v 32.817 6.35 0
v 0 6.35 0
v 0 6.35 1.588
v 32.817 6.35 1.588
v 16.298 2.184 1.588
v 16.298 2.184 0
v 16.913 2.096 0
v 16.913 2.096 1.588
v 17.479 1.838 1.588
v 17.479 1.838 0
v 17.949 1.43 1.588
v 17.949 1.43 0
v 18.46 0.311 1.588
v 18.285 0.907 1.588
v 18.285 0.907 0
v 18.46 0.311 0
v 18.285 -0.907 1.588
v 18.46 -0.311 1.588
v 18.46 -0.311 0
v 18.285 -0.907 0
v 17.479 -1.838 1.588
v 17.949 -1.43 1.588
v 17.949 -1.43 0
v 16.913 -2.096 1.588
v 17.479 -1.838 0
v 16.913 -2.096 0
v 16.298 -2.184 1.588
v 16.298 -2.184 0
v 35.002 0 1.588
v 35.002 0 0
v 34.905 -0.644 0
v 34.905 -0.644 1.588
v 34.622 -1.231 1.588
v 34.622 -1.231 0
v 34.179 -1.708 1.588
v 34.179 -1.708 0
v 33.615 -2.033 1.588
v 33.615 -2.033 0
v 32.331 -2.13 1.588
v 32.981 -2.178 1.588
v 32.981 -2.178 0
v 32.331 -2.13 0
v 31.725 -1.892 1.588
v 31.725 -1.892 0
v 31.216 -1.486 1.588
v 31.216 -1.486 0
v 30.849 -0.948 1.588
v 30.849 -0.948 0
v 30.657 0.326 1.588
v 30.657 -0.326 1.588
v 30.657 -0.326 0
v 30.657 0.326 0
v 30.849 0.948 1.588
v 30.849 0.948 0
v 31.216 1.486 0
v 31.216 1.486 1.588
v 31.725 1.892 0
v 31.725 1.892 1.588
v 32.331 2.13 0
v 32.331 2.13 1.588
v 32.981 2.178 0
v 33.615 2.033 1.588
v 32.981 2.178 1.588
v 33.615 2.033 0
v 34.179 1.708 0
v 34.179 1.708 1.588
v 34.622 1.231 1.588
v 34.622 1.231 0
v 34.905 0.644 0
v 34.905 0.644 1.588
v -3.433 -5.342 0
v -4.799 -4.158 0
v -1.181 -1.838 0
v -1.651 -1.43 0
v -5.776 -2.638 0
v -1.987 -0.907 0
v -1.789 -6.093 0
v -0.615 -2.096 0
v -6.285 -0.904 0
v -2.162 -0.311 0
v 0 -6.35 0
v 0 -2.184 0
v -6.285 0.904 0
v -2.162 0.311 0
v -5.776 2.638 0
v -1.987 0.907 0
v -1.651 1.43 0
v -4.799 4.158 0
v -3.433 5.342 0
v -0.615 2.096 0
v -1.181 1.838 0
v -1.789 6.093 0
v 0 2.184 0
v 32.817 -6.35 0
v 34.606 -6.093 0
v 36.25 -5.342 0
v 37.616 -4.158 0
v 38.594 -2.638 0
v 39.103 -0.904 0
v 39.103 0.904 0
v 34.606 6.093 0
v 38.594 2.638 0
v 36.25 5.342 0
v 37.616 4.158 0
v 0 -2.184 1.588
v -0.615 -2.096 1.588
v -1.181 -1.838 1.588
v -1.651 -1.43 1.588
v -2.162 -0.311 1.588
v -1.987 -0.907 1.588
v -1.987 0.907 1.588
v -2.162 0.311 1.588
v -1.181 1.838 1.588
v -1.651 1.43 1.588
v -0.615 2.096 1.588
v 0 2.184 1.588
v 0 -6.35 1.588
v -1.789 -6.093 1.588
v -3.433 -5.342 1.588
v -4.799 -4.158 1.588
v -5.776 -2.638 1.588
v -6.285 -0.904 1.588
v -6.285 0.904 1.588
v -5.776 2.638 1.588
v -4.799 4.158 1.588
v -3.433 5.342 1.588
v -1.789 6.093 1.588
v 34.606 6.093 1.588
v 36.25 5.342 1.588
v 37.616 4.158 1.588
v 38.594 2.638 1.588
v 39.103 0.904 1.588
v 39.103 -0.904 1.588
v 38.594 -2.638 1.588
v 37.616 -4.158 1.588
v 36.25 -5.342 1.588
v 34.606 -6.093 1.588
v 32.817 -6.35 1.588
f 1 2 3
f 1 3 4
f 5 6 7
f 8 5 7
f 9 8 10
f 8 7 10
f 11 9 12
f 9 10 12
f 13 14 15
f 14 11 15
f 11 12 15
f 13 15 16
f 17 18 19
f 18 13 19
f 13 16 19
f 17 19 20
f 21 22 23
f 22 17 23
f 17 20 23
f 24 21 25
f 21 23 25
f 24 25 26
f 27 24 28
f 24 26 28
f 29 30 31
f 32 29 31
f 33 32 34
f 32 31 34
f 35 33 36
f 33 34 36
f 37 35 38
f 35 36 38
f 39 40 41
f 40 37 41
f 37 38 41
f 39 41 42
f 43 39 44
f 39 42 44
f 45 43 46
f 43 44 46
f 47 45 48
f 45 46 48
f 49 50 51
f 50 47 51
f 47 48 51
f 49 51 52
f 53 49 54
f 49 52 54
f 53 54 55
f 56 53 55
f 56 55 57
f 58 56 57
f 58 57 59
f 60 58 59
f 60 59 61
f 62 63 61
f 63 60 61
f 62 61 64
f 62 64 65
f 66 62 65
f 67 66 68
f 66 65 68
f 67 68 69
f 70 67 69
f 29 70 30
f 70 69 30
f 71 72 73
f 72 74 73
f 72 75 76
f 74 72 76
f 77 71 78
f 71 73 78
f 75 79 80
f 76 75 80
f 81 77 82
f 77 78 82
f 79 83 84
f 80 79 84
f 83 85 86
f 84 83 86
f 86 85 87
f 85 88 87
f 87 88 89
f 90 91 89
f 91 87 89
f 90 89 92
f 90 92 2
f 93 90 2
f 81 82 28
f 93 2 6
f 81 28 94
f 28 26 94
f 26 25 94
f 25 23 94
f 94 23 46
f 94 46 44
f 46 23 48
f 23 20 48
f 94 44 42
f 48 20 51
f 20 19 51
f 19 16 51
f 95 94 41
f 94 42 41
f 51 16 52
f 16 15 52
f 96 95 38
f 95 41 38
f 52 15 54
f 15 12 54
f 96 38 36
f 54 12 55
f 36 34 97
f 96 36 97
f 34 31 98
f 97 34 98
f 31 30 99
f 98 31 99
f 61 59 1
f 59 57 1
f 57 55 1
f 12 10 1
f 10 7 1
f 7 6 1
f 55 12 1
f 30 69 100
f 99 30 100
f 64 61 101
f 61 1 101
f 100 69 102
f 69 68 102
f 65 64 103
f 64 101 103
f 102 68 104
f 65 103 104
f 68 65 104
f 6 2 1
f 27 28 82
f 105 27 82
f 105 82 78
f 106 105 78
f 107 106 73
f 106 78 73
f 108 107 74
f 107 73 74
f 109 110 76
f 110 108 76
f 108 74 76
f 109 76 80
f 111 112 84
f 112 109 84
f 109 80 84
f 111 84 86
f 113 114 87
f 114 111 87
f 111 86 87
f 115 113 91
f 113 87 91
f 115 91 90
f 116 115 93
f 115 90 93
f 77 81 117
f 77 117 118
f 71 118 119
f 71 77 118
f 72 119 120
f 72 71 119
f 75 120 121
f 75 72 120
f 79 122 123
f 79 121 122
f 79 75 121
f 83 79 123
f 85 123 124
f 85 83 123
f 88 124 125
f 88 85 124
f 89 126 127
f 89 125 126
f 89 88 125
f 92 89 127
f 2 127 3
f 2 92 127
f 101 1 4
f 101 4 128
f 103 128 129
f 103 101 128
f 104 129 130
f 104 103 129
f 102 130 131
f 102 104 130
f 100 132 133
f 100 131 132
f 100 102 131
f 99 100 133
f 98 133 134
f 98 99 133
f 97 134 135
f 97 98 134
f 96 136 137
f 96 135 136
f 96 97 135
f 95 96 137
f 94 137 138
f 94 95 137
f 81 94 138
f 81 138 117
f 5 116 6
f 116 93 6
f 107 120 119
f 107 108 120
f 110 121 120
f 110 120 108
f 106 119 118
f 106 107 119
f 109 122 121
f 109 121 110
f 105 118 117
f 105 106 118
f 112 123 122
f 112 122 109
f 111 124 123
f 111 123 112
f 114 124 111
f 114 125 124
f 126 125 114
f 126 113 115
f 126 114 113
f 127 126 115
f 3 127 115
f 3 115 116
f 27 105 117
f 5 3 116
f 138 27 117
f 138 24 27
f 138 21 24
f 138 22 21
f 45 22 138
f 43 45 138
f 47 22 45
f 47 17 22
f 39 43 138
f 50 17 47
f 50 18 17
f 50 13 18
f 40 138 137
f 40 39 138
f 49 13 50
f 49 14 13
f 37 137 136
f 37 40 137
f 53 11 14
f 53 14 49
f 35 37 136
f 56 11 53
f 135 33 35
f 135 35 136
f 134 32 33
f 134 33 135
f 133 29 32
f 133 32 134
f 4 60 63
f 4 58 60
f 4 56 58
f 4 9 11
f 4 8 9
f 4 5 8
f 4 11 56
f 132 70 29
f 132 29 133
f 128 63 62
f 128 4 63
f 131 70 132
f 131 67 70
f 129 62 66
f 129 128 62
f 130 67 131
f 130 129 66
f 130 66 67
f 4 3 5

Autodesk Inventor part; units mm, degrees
ref_plane "YZ Plane" through (0, 0, 0) normal (1, 0, 0) x (0, 1, 0)
ref_plane "XZ Plane" through (0, 0, 0) normal (0, 1, 0) x (-1, 0, 0)
ref_plane "XY Plane" through (0, 0, 0) normal (0, 0, 1) x (1, 0, 0)
sketch "main" plane through (0, 0, 0) normal (0, 0, 1) x (1, 0, 0)
  circle A0 centre (16.9271, 1.4076) radius 2.1844
  arc A1 (-15.8903, 3.592) -> (-15.8903, -0.7768) centre (-15.8903, 1.4076) ccw
  arc A2 (16.9271, -4.9424) -> (16.9271, 7.7576) centre (16.9271, 1.4076) ccw
  arc A3 (-15.8903, 7.7576) -> (-15.8903, -4.9424) centre (-15.8903, 1.4076) ccw
  line L0 (-15.8903, 7.7576) -> (16.9271, 7.7576)
  line L1 (16.9271, -4.9424) -> (-15.8903, -4.9424)
  arc A4 (0.4077, -0.7768) -> (0.4077, 3.592) centre (0.4077, 1.4076) ccw
  line L2 (-15.8903, 3.592) -> (0.4077, 3.592)
  line L3 (0.4077, -0.7768) -> (-15.8903, -0.7768)
  point P0 (-1.0706, 1.6197)
  dimension "d0" = 12.7
  dimension "d1" = 12.7
  dimension "d3" = 32.8174
  dimension "d4" = 4.3688
  dimension "d5" = 4.3688
sketch "Sketch1" plane through (0, 0, 0) normal (0, 0, 1) x (1, 0, 0)
  circle A0 centre (32.8174, 0) radius 2.1844
  arc A1 (0, 2.1844) -> (0, -2.1844) centre (0, 0) ccw
  arc A2 (32.8174, -6.35) -> (32.8174, 6.35) centre (32.8174, 0) ccw
  arc A3 (0, 6.35) -> (0, -6.35) centre (0, 0) ccw
  line L0 (0, 6.35) -> (32.8174, 6.35)
  line L1 (32.8174, -6.35) -> (0, -6.35)
  arc A4 (16.298, -2.1844) -> (16.298, 2.1844) centre (16.298, 0) ccw
  line L2 (0, 2.1844) -> (16.298, 2.1844)
  line L3 (16.298, -2.1844) -> (0, -2.1844)
extrude "Extrusion1" add sketch "Sketch1" along normal blind 1.5875
properties part number "Hardstop Gusset" material "Acetal Resin, White"
